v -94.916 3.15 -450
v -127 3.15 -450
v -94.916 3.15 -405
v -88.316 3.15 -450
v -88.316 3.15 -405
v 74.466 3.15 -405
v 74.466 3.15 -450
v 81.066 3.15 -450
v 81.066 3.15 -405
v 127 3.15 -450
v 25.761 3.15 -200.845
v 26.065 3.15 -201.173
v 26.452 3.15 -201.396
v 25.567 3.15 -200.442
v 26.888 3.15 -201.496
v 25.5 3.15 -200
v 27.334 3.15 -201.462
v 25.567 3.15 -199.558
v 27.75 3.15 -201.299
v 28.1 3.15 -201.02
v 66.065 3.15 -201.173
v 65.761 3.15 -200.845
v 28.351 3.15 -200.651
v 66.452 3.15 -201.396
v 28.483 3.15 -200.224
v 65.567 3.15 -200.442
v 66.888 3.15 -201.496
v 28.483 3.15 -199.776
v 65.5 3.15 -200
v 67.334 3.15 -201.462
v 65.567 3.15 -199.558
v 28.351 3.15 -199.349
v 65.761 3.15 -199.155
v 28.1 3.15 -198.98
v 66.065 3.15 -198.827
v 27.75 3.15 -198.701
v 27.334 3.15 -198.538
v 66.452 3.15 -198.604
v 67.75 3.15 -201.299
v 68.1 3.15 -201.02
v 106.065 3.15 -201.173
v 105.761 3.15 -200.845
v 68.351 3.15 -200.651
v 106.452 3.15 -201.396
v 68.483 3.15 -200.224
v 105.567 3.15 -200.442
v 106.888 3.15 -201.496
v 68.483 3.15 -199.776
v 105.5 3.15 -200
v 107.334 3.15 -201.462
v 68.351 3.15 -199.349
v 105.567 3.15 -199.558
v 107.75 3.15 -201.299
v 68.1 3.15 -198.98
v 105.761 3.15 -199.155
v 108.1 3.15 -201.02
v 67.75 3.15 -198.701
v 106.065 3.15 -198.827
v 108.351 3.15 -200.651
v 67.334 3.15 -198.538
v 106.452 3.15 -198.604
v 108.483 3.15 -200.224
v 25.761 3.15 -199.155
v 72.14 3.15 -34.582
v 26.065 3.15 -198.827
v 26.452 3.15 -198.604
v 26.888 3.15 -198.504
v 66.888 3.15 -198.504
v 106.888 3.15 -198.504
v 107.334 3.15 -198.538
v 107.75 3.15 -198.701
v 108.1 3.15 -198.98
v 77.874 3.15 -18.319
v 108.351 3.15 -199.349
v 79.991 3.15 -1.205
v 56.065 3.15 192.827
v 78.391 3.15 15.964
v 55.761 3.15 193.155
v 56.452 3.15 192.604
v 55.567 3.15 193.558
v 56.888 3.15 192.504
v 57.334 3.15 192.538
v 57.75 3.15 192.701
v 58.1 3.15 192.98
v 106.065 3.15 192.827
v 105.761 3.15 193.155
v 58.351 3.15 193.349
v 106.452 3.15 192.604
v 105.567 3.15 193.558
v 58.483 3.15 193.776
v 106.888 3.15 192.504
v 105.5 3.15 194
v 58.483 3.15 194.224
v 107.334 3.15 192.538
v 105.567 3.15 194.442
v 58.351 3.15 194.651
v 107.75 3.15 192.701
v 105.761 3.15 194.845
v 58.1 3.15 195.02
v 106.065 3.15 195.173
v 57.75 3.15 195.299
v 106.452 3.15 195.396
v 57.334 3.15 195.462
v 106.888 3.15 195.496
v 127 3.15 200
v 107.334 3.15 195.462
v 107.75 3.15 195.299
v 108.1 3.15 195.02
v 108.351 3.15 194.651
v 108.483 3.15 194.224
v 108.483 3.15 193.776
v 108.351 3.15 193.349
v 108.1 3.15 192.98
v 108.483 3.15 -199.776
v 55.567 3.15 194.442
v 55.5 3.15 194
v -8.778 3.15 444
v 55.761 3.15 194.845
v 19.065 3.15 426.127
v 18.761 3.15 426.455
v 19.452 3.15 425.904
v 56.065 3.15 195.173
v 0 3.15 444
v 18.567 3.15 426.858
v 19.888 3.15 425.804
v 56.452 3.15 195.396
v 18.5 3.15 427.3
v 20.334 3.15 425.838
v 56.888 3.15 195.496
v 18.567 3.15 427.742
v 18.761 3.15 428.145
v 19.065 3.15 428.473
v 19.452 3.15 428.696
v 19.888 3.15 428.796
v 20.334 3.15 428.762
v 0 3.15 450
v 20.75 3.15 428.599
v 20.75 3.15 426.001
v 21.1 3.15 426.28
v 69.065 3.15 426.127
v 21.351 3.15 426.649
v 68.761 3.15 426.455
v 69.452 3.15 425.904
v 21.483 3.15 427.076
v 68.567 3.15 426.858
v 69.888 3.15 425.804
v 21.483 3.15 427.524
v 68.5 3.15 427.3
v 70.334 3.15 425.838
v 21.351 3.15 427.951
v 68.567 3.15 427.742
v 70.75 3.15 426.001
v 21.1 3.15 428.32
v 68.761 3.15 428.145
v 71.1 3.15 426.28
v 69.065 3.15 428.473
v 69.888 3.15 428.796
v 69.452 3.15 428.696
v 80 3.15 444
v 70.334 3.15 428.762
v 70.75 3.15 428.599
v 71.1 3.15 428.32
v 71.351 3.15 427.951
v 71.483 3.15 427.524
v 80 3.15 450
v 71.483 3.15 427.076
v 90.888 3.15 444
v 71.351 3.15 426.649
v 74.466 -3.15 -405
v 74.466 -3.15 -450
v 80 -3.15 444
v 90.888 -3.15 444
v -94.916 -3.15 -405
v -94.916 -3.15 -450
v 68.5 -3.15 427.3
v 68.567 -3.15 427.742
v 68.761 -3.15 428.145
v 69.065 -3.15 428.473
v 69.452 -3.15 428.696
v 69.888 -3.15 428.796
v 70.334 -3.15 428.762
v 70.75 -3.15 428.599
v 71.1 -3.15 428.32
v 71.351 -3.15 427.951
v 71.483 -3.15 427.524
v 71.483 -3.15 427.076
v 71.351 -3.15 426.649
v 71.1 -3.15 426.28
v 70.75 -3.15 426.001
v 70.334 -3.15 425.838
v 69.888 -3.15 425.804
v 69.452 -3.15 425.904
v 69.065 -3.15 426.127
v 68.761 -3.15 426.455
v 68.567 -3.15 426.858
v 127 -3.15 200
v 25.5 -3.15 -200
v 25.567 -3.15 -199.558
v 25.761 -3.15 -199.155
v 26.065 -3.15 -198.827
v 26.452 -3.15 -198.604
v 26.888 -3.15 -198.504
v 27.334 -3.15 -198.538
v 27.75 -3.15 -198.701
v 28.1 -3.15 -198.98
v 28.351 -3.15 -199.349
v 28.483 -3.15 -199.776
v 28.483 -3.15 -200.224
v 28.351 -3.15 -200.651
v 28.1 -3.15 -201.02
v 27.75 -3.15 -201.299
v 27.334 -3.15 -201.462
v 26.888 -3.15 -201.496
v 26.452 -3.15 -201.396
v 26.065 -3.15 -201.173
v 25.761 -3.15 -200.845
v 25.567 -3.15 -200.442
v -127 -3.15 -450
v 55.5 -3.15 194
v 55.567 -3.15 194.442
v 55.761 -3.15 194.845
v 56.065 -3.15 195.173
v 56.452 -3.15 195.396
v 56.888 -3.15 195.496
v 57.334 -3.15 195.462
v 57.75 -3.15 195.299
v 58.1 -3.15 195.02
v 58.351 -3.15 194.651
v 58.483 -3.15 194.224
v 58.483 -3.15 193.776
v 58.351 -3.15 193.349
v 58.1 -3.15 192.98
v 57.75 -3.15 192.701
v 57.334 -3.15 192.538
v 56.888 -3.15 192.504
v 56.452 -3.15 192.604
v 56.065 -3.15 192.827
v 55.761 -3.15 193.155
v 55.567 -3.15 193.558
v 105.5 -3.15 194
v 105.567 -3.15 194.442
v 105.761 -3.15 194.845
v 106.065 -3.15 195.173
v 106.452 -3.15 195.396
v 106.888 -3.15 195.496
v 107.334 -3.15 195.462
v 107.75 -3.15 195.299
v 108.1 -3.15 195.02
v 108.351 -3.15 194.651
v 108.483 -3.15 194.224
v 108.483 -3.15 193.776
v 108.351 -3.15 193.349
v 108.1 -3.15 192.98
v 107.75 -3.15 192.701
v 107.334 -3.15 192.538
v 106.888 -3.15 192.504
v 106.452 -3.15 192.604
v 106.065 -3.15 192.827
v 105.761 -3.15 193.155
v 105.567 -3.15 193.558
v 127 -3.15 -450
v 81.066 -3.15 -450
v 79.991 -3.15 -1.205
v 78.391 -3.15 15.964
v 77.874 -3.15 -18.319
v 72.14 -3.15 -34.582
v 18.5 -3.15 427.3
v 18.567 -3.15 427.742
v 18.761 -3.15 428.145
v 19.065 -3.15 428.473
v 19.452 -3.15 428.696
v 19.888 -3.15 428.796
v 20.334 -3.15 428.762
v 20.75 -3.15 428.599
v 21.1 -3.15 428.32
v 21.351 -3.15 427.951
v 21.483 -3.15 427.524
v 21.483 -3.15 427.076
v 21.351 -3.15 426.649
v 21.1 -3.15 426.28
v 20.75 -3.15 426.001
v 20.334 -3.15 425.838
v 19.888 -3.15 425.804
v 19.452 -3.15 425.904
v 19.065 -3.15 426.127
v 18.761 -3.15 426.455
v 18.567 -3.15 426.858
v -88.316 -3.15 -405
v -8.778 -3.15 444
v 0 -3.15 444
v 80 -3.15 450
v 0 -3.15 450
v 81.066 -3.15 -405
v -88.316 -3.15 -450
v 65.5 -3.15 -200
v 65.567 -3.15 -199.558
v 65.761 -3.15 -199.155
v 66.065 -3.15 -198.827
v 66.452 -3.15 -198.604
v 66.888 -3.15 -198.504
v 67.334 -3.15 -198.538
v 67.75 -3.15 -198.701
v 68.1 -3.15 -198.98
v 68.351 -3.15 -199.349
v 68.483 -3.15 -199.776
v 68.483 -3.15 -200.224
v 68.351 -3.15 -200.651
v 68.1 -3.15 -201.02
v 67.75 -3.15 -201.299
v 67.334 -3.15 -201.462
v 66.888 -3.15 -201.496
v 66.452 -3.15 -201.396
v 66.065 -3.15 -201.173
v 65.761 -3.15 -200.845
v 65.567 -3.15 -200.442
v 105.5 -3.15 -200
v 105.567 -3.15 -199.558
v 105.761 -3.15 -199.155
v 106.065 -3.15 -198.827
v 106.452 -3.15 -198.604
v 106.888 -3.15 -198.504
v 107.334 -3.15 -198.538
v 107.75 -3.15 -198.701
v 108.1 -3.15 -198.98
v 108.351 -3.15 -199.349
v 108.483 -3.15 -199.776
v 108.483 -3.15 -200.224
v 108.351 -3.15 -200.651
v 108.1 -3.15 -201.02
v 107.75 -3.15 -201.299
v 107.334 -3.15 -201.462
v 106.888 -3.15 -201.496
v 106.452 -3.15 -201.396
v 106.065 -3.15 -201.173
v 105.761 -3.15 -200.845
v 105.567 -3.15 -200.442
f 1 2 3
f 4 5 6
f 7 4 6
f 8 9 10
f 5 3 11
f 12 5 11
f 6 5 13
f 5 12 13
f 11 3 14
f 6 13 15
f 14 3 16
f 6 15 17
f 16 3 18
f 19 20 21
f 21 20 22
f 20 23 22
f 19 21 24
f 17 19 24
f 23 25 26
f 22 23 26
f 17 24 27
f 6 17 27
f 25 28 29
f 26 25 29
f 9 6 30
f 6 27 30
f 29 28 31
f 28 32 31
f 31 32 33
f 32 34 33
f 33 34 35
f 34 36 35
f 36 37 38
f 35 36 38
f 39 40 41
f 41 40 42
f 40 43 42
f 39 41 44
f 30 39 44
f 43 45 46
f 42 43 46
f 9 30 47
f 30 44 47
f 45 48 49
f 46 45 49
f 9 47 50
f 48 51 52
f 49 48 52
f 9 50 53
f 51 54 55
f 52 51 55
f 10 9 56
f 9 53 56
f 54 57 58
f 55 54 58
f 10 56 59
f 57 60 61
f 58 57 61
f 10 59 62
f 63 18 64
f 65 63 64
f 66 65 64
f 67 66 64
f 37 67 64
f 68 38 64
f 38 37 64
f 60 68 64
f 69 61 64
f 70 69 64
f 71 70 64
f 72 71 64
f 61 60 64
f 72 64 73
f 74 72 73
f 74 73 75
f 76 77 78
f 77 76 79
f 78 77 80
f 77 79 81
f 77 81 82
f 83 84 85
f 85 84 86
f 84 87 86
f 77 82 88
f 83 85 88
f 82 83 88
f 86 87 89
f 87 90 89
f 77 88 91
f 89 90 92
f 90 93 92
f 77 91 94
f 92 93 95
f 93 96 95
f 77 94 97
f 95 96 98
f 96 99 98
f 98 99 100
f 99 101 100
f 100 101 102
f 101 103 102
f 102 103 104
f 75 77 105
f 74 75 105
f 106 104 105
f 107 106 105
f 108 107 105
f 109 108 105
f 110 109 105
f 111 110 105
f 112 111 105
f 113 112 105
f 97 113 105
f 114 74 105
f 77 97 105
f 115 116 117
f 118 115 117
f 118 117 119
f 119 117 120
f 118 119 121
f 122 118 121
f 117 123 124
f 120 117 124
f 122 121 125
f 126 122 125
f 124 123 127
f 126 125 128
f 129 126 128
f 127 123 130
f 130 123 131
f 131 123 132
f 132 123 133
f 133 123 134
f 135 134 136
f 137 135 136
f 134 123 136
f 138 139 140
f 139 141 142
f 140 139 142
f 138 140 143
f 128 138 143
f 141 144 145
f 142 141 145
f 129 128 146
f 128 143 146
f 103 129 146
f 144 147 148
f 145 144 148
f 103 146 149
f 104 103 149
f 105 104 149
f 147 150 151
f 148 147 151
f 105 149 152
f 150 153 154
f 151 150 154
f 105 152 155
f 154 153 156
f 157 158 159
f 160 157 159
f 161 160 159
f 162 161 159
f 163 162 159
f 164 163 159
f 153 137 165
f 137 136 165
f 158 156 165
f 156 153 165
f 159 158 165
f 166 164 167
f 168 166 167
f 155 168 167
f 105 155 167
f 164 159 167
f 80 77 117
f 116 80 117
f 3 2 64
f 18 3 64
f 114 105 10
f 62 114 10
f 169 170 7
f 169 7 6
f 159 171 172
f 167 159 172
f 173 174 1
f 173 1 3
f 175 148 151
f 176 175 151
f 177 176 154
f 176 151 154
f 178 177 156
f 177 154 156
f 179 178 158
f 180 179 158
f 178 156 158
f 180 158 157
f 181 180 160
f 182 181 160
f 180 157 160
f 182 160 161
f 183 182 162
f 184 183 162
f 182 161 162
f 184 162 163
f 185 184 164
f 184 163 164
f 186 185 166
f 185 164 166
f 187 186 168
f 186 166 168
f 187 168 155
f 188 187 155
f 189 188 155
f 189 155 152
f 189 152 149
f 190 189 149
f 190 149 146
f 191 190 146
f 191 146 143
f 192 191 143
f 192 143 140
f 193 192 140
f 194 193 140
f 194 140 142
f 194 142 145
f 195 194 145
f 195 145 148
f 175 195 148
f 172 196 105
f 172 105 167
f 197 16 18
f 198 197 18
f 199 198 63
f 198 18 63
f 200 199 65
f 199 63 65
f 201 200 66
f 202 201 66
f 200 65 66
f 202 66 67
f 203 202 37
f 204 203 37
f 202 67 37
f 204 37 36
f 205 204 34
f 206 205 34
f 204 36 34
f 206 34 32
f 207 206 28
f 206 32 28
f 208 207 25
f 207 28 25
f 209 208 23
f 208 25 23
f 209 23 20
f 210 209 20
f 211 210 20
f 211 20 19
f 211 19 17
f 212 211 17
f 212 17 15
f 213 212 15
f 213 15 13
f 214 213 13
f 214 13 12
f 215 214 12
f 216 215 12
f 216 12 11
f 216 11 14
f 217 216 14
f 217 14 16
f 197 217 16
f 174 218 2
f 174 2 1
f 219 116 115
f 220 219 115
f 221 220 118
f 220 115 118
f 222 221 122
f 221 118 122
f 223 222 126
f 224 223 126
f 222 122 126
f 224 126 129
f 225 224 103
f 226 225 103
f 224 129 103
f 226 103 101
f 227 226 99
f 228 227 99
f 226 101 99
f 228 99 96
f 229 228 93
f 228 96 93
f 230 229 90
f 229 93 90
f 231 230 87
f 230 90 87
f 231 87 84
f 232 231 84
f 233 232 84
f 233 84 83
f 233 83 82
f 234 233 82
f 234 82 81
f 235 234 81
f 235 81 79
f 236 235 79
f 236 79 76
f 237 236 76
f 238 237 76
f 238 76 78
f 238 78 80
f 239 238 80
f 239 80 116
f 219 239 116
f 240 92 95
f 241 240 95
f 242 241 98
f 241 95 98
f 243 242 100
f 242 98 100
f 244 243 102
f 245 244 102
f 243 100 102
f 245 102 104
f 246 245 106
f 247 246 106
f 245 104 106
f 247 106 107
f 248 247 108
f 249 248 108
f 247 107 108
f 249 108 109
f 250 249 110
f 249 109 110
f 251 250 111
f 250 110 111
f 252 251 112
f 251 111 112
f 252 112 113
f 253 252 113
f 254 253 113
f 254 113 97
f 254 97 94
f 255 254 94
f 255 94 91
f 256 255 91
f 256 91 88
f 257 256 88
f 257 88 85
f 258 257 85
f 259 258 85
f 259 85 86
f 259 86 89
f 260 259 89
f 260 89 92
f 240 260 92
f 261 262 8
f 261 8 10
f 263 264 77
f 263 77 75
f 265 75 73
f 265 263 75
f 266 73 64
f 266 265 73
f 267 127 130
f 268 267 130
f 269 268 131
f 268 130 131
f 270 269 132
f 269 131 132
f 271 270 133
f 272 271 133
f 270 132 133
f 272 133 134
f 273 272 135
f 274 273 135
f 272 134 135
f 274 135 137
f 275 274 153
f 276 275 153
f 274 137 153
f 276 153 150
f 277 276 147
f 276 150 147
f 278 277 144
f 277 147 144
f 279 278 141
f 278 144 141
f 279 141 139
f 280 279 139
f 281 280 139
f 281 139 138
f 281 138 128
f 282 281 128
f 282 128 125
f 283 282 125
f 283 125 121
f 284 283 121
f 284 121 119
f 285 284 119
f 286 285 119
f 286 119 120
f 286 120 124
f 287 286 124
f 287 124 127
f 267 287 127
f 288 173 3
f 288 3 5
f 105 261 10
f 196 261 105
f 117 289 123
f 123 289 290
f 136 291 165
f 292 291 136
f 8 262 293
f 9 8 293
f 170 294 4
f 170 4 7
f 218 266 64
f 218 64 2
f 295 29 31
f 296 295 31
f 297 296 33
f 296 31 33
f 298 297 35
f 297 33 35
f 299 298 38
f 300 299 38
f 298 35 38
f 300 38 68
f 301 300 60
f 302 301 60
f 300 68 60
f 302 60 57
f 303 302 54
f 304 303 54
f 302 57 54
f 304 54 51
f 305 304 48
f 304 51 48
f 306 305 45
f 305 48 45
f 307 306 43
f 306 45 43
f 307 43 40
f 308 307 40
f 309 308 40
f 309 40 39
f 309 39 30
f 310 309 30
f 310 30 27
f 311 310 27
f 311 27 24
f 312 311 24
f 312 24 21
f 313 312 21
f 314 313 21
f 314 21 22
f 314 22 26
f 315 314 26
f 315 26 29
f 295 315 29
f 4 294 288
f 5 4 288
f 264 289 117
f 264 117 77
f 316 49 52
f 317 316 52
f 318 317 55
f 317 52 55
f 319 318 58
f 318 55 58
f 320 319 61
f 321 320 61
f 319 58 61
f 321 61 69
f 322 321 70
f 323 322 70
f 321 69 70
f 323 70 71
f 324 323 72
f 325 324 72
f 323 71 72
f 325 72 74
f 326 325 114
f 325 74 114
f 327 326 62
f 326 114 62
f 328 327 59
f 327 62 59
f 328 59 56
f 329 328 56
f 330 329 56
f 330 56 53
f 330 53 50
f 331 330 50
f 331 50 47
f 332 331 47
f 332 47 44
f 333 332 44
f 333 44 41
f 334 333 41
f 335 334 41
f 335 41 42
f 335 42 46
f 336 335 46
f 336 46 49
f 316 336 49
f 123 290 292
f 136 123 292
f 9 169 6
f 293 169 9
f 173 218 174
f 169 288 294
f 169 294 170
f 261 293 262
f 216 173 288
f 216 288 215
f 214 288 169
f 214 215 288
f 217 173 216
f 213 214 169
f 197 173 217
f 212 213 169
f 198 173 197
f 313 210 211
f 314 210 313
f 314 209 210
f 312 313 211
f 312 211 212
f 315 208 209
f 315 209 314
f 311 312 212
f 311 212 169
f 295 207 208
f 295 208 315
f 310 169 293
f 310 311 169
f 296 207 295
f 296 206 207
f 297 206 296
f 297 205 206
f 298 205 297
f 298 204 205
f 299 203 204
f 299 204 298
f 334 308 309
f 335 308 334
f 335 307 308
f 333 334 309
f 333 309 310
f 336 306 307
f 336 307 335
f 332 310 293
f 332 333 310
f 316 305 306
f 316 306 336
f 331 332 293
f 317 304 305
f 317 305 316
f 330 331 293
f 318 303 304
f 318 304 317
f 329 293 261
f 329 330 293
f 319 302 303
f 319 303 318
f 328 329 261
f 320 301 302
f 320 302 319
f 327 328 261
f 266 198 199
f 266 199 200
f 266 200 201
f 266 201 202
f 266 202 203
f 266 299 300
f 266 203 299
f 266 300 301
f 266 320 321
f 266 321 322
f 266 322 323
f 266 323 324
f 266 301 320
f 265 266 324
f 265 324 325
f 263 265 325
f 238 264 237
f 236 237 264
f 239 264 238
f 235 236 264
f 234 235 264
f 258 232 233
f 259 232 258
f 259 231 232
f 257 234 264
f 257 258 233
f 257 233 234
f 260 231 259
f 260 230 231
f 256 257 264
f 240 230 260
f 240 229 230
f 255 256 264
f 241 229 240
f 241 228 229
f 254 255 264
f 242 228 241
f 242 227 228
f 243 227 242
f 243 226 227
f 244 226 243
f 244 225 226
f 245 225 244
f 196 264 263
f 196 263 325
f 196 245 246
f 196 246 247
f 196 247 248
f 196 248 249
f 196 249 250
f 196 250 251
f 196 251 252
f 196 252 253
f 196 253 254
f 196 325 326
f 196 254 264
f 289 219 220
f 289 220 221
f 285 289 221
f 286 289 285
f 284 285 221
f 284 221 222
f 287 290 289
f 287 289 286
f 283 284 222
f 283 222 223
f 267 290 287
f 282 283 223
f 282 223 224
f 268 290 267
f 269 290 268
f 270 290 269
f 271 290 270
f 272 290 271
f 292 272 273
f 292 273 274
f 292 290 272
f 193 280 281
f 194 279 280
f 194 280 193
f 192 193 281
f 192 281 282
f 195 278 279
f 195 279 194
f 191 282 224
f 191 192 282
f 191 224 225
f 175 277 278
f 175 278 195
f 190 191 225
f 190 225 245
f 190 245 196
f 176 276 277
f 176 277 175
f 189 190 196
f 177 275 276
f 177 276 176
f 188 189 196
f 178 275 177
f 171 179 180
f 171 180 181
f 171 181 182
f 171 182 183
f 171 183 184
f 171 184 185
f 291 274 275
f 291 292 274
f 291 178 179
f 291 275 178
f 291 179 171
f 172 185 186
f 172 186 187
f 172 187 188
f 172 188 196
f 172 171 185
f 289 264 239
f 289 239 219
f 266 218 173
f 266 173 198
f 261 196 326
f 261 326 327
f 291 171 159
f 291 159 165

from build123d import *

# Parameters (mm, degrees)
F1_DEPTH = 3.15
F2_W     = 30.610543
F2_H     = 6
F2_W_2   = 33.654636
F2_W_3   = 6.6
F2_H_2   = 45
F3_DEPTH = 6.301
F5_D     = 3


with BuildPart() as f1:
    # F0 (on Front) → F1 (new body, symmetric)
    with BuildSketch(Plane.XZ):
        with BuildLine():
            Line((90, 450), (-10, 450))
            Line((-10, 450), (78.390962, 15.964244))
            ThreePointArc((78.390962, 15.964244), (79.395078, -9.81945), (72.139537, -34.581603))
            Line((72.139537, -34.581603), (-127, -450))
            Line((-127, -450), (127, -450))
            Line((127, -450), (127, 200))
            Line((127, 200), (90, 450))
        make_face()
    extrude(amount=F1_DEPTH, both=True)

    # F2 (on face) → F3 (cut, through all)
    with BuildSketch(Plane.XZ.offset(3.15)):
        with Locations((-15.305271, 447)):
            Rectangle(F2_W, F2_H)
        with Locations((96.827318, 447)):
            Rectangle(F2_W_2, F2_H)
        with Locations((-91.615785, -427.5)):
            Rectangle(F2_W_3, F2_H_2)
        with Locations((77.765864, -427.5)):
            Rectangle(F2_W_3, F2_H_2)
    extrude(amount=-F3_DEPTH, mode=Mode.SUBTRACT)

    # F5 (through all)
    with Locations(Plane.XZ.offset(3.15)):
        with Locations((20, 427.3), (70, 427.3), (107, 194), (57, 194), (107, -200), (67, -200), (27, -200)):
            Hole(F5_D / 2)


solid = f1.part
